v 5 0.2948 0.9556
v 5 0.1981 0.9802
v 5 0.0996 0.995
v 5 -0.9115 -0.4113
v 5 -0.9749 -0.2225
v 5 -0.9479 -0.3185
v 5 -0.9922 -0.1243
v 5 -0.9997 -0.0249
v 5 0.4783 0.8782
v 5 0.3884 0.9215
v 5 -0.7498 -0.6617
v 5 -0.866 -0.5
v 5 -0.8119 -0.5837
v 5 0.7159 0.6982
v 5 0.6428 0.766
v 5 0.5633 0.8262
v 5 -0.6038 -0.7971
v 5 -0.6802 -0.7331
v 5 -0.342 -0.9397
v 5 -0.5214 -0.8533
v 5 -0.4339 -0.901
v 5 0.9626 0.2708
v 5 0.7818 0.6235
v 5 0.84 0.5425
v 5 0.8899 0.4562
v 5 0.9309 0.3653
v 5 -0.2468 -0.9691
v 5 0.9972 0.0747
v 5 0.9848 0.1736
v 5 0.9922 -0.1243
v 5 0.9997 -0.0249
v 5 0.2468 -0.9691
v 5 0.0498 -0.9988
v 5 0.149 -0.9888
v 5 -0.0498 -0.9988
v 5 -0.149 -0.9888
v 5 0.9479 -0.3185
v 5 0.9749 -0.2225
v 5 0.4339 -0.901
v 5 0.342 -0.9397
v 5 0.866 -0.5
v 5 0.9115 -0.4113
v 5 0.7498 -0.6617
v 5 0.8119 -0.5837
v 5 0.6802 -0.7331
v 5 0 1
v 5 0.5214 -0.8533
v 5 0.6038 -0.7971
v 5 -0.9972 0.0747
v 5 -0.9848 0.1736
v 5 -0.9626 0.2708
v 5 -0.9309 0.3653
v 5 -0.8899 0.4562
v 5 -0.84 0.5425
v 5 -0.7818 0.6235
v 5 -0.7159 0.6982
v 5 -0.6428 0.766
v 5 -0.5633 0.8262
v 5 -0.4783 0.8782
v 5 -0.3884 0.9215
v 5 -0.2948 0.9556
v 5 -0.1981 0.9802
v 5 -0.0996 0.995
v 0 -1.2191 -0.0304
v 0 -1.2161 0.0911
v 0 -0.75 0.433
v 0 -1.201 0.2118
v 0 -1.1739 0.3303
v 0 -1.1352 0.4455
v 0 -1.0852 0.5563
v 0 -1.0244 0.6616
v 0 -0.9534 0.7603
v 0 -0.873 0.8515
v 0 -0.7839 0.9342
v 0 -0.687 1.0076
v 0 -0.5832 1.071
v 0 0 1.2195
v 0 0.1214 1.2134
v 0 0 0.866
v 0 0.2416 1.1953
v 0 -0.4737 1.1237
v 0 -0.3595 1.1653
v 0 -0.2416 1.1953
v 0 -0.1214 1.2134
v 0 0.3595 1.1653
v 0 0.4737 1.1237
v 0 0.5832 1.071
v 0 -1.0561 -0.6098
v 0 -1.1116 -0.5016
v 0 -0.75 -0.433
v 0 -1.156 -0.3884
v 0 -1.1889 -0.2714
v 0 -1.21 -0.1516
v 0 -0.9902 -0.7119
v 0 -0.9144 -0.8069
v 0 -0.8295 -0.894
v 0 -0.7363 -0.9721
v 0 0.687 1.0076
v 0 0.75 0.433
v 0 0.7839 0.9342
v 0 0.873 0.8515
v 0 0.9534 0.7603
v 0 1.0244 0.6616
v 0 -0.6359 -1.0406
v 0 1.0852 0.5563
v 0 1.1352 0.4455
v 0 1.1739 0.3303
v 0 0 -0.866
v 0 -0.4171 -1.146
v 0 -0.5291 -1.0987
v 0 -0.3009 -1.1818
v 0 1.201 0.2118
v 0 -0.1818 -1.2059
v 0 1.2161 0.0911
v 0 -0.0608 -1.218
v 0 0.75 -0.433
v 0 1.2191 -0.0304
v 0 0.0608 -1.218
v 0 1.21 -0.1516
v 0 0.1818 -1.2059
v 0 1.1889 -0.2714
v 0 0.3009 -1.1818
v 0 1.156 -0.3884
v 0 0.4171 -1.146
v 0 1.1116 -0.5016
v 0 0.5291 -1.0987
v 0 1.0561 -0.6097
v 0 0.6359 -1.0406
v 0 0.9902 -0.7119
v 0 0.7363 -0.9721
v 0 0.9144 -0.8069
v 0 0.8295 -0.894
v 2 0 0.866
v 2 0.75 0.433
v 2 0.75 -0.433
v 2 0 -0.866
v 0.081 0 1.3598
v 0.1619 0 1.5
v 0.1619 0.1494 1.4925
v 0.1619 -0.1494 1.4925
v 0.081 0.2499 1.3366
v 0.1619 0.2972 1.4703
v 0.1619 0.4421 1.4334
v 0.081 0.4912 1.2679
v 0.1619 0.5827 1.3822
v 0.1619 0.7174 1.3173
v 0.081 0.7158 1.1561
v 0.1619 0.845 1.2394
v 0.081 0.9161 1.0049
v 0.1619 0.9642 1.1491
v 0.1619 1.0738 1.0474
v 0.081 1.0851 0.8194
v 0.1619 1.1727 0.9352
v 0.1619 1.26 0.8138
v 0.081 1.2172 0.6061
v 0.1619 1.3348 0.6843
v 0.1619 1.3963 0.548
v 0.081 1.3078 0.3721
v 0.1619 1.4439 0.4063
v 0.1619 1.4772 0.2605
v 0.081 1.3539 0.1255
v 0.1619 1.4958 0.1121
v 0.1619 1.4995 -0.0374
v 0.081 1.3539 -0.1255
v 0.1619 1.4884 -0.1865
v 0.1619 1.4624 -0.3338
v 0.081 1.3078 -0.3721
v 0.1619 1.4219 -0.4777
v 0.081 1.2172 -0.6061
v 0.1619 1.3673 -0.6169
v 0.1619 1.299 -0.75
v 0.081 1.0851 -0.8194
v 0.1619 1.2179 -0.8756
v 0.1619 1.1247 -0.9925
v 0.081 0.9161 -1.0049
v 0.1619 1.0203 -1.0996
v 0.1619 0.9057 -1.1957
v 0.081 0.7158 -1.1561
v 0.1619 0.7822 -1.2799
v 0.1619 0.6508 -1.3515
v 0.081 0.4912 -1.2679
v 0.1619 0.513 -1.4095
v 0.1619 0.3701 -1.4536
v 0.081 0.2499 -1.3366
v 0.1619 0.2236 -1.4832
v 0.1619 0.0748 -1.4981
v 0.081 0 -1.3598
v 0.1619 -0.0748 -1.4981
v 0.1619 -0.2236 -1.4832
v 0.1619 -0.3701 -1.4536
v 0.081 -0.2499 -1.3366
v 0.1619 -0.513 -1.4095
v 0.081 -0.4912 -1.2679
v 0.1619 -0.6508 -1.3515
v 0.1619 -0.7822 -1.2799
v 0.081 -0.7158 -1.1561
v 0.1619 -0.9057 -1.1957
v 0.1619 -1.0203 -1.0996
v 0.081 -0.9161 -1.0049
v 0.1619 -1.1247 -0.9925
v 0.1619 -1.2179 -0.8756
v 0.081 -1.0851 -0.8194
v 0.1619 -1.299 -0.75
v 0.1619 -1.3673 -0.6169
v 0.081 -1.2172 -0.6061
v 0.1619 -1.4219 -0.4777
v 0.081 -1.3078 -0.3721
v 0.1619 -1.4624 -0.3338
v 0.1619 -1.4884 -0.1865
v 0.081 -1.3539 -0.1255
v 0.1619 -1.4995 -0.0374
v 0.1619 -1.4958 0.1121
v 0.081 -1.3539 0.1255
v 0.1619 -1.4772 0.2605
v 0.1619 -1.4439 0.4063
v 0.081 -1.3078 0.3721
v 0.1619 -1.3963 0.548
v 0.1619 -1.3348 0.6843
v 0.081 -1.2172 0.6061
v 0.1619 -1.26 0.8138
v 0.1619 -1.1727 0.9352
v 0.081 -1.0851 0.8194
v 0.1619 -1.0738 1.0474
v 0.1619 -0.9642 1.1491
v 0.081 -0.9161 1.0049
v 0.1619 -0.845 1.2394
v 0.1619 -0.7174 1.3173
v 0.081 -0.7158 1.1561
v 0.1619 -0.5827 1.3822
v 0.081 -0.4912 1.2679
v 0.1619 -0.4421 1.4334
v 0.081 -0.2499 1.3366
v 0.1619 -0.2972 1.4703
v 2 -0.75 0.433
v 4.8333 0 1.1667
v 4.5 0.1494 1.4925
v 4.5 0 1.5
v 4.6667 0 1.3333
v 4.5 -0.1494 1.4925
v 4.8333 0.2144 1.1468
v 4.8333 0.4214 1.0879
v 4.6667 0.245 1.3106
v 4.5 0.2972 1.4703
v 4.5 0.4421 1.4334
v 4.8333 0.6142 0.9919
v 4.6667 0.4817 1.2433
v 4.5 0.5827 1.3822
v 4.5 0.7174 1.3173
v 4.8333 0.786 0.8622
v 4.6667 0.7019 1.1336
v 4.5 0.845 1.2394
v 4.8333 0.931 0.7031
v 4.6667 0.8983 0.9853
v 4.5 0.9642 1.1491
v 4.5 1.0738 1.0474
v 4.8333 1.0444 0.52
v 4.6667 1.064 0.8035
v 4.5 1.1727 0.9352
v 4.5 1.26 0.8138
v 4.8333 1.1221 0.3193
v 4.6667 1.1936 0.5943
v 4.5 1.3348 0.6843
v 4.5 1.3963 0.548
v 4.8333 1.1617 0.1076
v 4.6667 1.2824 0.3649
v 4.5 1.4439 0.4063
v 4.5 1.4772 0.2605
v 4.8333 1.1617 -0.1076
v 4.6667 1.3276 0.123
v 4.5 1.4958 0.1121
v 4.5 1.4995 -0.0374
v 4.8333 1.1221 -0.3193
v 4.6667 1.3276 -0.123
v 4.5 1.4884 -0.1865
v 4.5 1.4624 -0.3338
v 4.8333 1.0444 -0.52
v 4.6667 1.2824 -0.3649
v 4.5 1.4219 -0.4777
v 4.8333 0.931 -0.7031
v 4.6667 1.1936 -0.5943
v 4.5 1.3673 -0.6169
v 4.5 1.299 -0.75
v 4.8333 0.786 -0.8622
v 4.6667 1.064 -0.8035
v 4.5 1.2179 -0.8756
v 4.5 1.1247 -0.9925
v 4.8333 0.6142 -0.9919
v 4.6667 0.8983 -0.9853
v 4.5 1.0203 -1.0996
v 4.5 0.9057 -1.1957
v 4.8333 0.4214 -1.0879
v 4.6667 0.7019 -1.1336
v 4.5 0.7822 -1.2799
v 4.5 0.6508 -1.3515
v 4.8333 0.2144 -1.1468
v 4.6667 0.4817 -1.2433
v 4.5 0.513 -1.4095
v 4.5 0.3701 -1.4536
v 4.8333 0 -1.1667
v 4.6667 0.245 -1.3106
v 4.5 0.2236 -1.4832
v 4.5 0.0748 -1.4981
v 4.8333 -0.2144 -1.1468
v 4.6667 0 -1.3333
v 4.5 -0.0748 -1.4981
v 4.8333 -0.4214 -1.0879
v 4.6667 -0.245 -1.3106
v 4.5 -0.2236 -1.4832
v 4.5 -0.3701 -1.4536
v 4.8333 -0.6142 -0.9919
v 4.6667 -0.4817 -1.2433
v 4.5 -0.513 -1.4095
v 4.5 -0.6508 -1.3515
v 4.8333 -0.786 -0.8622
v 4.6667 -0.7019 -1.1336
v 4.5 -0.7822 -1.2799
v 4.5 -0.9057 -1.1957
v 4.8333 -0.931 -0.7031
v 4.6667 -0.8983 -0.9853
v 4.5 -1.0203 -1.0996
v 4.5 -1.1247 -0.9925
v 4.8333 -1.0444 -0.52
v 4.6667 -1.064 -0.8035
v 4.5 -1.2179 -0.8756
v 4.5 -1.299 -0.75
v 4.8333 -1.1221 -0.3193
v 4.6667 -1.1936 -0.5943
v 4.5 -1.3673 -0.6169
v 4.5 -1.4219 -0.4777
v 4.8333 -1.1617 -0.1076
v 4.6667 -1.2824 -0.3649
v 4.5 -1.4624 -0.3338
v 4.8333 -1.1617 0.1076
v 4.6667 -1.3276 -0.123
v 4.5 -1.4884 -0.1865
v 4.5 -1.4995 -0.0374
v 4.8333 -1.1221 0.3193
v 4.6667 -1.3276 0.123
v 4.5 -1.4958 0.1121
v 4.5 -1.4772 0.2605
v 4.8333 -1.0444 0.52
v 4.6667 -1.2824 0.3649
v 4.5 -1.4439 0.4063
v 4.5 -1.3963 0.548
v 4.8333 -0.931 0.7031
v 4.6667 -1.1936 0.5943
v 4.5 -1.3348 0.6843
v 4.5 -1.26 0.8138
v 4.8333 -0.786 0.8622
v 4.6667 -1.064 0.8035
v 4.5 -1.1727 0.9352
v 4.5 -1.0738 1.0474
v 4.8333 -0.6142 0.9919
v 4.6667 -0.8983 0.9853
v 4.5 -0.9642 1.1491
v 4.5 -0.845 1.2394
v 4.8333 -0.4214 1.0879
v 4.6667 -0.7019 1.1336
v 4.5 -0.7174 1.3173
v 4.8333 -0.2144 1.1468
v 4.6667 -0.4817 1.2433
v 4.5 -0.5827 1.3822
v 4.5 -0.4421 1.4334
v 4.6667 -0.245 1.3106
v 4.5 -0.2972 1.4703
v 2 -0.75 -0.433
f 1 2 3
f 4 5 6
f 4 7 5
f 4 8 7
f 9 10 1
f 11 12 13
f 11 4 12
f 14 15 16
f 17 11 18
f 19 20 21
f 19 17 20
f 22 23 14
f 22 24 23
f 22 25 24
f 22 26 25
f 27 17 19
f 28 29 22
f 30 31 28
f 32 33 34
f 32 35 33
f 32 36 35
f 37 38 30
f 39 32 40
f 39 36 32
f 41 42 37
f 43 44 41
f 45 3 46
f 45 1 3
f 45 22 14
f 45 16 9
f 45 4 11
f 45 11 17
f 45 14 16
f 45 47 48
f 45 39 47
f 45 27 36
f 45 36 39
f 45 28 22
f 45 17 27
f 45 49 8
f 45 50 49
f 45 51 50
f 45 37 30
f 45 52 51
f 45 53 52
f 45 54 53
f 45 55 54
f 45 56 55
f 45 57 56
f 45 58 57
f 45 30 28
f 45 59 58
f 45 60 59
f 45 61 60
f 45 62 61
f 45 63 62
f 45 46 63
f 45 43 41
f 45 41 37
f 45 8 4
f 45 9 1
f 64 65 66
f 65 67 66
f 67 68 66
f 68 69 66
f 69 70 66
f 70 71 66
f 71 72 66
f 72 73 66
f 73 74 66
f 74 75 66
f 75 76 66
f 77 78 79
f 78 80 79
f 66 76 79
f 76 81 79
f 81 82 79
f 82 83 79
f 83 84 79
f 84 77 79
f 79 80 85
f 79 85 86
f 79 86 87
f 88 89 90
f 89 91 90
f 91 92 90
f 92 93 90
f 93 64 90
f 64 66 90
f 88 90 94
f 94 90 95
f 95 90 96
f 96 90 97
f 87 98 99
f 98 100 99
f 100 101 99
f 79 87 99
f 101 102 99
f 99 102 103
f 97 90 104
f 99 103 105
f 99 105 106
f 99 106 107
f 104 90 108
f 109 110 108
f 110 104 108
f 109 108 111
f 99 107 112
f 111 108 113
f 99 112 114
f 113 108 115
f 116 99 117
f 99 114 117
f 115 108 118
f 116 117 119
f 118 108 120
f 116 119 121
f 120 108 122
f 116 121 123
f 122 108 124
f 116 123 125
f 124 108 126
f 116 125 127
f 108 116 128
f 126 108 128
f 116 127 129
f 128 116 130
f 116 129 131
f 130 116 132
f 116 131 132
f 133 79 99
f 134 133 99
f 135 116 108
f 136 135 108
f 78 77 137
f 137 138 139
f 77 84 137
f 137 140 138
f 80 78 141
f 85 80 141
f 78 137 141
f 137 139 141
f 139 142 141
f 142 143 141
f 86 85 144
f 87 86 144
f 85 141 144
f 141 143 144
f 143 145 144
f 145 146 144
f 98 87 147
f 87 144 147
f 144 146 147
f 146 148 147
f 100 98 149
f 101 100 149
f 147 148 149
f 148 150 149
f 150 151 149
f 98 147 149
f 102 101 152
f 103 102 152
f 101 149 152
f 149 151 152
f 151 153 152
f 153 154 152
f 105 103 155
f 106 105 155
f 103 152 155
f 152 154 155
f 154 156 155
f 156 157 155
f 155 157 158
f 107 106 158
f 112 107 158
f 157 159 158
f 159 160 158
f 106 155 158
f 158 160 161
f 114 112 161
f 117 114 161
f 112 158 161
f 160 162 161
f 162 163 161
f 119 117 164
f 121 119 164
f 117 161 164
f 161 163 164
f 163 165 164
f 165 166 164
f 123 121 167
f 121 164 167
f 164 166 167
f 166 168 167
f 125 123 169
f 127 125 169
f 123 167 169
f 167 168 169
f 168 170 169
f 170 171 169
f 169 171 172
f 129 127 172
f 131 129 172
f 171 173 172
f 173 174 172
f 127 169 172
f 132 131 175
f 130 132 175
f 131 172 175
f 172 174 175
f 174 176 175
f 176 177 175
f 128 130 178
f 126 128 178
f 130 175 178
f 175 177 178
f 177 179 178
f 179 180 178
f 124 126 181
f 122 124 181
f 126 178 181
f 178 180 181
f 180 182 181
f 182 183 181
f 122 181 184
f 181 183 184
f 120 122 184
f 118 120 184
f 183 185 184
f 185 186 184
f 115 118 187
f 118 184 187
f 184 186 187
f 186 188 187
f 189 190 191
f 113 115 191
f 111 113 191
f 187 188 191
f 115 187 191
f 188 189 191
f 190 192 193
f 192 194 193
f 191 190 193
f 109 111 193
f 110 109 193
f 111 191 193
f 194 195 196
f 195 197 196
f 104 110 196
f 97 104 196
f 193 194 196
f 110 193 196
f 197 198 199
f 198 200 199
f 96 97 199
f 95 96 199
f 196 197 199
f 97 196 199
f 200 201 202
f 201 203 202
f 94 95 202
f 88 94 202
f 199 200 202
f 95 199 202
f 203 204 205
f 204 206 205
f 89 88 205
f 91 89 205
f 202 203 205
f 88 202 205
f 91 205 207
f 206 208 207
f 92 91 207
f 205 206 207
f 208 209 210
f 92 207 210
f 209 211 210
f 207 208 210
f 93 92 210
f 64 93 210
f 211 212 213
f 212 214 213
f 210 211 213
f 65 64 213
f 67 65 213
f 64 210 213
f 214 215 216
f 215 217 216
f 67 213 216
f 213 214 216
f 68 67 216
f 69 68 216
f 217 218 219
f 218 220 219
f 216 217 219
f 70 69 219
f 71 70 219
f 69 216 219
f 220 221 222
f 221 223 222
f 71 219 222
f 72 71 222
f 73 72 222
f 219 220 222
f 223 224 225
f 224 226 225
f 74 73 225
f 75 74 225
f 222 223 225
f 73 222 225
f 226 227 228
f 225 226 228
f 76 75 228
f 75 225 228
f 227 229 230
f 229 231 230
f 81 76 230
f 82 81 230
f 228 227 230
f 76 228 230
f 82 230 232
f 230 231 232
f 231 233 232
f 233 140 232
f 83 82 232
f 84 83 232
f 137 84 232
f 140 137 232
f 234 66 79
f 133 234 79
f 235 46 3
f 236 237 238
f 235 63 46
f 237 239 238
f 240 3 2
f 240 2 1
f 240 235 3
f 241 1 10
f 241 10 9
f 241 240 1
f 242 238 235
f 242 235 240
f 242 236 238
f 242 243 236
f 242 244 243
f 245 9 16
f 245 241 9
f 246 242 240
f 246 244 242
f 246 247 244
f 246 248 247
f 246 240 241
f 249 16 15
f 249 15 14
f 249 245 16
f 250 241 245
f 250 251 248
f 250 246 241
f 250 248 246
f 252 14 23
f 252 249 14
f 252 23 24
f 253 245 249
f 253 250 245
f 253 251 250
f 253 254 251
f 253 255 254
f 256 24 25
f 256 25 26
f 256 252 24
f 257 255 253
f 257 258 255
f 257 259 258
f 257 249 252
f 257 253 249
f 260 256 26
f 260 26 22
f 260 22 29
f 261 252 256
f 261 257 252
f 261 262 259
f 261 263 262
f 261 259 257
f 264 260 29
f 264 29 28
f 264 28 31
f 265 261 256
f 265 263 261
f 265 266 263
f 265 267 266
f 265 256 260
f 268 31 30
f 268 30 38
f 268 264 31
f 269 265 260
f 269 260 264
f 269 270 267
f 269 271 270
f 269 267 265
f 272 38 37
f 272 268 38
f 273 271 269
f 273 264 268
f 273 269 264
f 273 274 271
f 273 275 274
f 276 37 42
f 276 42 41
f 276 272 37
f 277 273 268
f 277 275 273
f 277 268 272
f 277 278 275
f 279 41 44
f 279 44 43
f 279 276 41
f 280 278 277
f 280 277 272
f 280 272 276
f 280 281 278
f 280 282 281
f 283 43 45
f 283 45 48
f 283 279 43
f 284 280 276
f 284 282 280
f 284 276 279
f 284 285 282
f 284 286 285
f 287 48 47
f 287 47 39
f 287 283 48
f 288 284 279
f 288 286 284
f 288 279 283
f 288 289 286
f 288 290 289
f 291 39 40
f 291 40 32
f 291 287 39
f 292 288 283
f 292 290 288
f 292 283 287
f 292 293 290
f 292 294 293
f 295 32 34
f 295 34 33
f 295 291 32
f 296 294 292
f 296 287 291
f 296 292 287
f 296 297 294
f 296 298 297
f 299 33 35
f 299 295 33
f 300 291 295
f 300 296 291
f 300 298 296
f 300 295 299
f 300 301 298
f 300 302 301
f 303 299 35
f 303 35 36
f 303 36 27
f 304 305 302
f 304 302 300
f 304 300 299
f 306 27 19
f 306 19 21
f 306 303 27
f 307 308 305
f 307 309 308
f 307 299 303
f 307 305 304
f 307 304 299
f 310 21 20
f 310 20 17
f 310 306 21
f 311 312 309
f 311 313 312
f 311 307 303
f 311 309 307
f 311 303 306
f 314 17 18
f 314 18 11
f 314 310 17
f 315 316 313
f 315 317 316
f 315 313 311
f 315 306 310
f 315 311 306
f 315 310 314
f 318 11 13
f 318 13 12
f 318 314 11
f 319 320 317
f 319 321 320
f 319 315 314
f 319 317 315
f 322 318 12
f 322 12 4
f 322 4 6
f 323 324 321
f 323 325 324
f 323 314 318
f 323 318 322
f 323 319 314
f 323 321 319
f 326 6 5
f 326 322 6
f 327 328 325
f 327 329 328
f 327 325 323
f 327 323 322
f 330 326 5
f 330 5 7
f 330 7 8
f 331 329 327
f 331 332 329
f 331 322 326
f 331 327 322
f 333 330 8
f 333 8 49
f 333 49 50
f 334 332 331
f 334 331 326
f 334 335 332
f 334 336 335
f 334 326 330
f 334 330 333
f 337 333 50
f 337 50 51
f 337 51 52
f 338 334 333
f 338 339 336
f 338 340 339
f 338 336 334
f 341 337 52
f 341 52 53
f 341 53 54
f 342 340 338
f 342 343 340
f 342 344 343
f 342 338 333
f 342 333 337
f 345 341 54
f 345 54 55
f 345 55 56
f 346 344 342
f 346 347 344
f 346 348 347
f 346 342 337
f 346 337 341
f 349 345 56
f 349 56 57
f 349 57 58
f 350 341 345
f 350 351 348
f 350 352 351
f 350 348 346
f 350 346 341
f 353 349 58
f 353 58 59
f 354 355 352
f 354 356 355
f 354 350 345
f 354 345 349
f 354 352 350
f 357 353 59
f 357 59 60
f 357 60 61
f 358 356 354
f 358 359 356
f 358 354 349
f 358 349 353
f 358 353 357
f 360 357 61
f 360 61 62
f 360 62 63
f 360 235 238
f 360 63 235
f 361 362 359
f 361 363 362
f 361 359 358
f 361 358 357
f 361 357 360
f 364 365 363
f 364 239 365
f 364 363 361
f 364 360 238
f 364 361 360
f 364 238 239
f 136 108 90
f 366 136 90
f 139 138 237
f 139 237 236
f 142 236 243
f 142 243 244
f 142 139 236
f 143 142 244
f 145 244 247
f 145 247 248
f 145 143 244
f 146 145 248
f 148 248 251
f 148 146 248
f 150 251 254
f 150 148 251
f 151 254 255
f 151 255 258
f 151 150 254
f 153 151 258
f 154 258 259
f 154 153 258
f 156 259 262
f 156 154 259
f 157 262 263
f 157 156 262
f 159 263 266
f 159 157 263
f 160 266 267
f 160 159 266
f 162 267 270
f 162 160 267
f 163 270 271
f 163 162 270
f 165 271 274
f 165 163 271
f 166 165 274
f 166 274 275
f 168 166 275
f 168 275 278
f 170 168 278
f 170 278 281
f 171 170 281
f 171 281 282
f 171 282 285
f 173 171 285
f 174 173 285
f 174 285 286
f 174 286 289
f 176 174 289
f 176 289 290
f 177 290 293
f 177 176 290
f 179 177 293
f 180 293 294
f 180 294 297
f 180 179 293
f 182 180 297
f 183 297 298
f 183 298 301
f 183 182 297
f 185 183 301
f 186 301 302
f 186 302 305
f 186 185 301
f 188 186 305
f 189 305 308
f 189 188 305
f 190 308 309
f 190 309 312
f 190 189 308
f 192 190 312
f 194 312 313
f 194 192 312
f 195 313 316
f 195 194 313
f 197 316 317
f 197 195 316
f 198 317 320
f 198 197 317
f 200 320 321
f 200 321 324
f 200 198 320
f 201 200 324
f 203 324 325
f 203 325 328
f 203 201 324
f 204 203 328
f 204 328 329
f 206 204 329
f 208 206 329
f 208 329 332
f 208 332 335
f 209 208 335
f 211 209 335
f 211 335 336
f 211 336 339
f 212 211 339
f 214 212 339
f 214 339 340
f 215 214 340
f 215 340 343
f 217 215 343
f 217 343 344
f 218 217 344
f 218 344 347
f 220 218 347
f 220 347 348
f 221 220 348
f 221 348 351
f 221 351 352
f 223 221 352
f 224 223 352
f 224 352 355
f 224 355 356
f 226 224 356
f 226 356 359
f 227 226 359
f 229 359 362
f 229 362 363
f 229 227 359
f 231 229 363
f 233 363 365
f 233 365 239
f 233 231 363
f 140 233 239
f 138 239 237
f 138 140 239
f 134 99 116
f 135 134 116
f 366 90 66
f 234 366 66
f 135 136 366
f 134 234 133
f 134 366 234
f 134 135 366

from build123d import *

# Parameters (mm, degrees)
ESQUISSE1_W             = 5
ESQUISSE1_H             = 1.5
ENL_V_MAT_EXTRU_1_DEPTH = 2
CHANFREIN1_SIZE         = 0.5
CHANFREIN2_SIZE         = 0.2805
CHANFREIN2_SIZE2        = 0.161946751


with BuildPart() as part:
    # Esquisse1 → Révolution1 (revolve)
    with BuildSketch(Plane(origin=(0, 0, 0), x_dir=(-1, 0, 0), z_dir=(0, 0, -1)), mode=Mode.PRIVATE) as r_volution1_sk:
        with Locations((-2.5, 0.75)):
            Rectangle(ESQUISSE1_W, ESQUISSE1_H)
    revolve(r_volution1_sk.sketch.rotate(Axis((5, 0, 0), (-1, 0, 0)), 270), axis=Axis((5, 0, 0), (-1, 0, 0)))

    # Esquisse2 → Enlèv. mat.-Extru.1 (cut)
    with BuildSketch(Plane.ZY):
        Polygon((0.433012702, -0.75), (0.866025404, 0), (0.433012702, 0.75), (-0.433012702, 0.75), (-0.866025404, 0), (-0.433012702, -0.75), align=None)
    extrude(amount=-ENL_V_MAT_EXTRU_1_DEPTH, mode=Mode.SUBTRACT)

    # Chanfrein1
    chanfrein1_edges = [part.edges().sort_by_distance(p)[0] for p in [
        (5, 0, -1.5),
    ]]
    chamfer(chanfrein1_edges, length=CHANFREIN1_SIZE)

    # Chanfrein2
    chanfrein2_edges = [part.edges().sort_by_distance(p)[0] for p in [
        (0, 0, -1.5),
    ]]
    chanfrein2_side = [part.faces().sort_by_distance(p)[0] for p in [
        (0, 0, -1.457573593),
    ]]
    chamfer(chanfrein2_edges, length=CHANFREIN2_SIZE, length2=CHANFREIN2_SIZE2, reference=chanfrein2_side[0])


solid = part.part
